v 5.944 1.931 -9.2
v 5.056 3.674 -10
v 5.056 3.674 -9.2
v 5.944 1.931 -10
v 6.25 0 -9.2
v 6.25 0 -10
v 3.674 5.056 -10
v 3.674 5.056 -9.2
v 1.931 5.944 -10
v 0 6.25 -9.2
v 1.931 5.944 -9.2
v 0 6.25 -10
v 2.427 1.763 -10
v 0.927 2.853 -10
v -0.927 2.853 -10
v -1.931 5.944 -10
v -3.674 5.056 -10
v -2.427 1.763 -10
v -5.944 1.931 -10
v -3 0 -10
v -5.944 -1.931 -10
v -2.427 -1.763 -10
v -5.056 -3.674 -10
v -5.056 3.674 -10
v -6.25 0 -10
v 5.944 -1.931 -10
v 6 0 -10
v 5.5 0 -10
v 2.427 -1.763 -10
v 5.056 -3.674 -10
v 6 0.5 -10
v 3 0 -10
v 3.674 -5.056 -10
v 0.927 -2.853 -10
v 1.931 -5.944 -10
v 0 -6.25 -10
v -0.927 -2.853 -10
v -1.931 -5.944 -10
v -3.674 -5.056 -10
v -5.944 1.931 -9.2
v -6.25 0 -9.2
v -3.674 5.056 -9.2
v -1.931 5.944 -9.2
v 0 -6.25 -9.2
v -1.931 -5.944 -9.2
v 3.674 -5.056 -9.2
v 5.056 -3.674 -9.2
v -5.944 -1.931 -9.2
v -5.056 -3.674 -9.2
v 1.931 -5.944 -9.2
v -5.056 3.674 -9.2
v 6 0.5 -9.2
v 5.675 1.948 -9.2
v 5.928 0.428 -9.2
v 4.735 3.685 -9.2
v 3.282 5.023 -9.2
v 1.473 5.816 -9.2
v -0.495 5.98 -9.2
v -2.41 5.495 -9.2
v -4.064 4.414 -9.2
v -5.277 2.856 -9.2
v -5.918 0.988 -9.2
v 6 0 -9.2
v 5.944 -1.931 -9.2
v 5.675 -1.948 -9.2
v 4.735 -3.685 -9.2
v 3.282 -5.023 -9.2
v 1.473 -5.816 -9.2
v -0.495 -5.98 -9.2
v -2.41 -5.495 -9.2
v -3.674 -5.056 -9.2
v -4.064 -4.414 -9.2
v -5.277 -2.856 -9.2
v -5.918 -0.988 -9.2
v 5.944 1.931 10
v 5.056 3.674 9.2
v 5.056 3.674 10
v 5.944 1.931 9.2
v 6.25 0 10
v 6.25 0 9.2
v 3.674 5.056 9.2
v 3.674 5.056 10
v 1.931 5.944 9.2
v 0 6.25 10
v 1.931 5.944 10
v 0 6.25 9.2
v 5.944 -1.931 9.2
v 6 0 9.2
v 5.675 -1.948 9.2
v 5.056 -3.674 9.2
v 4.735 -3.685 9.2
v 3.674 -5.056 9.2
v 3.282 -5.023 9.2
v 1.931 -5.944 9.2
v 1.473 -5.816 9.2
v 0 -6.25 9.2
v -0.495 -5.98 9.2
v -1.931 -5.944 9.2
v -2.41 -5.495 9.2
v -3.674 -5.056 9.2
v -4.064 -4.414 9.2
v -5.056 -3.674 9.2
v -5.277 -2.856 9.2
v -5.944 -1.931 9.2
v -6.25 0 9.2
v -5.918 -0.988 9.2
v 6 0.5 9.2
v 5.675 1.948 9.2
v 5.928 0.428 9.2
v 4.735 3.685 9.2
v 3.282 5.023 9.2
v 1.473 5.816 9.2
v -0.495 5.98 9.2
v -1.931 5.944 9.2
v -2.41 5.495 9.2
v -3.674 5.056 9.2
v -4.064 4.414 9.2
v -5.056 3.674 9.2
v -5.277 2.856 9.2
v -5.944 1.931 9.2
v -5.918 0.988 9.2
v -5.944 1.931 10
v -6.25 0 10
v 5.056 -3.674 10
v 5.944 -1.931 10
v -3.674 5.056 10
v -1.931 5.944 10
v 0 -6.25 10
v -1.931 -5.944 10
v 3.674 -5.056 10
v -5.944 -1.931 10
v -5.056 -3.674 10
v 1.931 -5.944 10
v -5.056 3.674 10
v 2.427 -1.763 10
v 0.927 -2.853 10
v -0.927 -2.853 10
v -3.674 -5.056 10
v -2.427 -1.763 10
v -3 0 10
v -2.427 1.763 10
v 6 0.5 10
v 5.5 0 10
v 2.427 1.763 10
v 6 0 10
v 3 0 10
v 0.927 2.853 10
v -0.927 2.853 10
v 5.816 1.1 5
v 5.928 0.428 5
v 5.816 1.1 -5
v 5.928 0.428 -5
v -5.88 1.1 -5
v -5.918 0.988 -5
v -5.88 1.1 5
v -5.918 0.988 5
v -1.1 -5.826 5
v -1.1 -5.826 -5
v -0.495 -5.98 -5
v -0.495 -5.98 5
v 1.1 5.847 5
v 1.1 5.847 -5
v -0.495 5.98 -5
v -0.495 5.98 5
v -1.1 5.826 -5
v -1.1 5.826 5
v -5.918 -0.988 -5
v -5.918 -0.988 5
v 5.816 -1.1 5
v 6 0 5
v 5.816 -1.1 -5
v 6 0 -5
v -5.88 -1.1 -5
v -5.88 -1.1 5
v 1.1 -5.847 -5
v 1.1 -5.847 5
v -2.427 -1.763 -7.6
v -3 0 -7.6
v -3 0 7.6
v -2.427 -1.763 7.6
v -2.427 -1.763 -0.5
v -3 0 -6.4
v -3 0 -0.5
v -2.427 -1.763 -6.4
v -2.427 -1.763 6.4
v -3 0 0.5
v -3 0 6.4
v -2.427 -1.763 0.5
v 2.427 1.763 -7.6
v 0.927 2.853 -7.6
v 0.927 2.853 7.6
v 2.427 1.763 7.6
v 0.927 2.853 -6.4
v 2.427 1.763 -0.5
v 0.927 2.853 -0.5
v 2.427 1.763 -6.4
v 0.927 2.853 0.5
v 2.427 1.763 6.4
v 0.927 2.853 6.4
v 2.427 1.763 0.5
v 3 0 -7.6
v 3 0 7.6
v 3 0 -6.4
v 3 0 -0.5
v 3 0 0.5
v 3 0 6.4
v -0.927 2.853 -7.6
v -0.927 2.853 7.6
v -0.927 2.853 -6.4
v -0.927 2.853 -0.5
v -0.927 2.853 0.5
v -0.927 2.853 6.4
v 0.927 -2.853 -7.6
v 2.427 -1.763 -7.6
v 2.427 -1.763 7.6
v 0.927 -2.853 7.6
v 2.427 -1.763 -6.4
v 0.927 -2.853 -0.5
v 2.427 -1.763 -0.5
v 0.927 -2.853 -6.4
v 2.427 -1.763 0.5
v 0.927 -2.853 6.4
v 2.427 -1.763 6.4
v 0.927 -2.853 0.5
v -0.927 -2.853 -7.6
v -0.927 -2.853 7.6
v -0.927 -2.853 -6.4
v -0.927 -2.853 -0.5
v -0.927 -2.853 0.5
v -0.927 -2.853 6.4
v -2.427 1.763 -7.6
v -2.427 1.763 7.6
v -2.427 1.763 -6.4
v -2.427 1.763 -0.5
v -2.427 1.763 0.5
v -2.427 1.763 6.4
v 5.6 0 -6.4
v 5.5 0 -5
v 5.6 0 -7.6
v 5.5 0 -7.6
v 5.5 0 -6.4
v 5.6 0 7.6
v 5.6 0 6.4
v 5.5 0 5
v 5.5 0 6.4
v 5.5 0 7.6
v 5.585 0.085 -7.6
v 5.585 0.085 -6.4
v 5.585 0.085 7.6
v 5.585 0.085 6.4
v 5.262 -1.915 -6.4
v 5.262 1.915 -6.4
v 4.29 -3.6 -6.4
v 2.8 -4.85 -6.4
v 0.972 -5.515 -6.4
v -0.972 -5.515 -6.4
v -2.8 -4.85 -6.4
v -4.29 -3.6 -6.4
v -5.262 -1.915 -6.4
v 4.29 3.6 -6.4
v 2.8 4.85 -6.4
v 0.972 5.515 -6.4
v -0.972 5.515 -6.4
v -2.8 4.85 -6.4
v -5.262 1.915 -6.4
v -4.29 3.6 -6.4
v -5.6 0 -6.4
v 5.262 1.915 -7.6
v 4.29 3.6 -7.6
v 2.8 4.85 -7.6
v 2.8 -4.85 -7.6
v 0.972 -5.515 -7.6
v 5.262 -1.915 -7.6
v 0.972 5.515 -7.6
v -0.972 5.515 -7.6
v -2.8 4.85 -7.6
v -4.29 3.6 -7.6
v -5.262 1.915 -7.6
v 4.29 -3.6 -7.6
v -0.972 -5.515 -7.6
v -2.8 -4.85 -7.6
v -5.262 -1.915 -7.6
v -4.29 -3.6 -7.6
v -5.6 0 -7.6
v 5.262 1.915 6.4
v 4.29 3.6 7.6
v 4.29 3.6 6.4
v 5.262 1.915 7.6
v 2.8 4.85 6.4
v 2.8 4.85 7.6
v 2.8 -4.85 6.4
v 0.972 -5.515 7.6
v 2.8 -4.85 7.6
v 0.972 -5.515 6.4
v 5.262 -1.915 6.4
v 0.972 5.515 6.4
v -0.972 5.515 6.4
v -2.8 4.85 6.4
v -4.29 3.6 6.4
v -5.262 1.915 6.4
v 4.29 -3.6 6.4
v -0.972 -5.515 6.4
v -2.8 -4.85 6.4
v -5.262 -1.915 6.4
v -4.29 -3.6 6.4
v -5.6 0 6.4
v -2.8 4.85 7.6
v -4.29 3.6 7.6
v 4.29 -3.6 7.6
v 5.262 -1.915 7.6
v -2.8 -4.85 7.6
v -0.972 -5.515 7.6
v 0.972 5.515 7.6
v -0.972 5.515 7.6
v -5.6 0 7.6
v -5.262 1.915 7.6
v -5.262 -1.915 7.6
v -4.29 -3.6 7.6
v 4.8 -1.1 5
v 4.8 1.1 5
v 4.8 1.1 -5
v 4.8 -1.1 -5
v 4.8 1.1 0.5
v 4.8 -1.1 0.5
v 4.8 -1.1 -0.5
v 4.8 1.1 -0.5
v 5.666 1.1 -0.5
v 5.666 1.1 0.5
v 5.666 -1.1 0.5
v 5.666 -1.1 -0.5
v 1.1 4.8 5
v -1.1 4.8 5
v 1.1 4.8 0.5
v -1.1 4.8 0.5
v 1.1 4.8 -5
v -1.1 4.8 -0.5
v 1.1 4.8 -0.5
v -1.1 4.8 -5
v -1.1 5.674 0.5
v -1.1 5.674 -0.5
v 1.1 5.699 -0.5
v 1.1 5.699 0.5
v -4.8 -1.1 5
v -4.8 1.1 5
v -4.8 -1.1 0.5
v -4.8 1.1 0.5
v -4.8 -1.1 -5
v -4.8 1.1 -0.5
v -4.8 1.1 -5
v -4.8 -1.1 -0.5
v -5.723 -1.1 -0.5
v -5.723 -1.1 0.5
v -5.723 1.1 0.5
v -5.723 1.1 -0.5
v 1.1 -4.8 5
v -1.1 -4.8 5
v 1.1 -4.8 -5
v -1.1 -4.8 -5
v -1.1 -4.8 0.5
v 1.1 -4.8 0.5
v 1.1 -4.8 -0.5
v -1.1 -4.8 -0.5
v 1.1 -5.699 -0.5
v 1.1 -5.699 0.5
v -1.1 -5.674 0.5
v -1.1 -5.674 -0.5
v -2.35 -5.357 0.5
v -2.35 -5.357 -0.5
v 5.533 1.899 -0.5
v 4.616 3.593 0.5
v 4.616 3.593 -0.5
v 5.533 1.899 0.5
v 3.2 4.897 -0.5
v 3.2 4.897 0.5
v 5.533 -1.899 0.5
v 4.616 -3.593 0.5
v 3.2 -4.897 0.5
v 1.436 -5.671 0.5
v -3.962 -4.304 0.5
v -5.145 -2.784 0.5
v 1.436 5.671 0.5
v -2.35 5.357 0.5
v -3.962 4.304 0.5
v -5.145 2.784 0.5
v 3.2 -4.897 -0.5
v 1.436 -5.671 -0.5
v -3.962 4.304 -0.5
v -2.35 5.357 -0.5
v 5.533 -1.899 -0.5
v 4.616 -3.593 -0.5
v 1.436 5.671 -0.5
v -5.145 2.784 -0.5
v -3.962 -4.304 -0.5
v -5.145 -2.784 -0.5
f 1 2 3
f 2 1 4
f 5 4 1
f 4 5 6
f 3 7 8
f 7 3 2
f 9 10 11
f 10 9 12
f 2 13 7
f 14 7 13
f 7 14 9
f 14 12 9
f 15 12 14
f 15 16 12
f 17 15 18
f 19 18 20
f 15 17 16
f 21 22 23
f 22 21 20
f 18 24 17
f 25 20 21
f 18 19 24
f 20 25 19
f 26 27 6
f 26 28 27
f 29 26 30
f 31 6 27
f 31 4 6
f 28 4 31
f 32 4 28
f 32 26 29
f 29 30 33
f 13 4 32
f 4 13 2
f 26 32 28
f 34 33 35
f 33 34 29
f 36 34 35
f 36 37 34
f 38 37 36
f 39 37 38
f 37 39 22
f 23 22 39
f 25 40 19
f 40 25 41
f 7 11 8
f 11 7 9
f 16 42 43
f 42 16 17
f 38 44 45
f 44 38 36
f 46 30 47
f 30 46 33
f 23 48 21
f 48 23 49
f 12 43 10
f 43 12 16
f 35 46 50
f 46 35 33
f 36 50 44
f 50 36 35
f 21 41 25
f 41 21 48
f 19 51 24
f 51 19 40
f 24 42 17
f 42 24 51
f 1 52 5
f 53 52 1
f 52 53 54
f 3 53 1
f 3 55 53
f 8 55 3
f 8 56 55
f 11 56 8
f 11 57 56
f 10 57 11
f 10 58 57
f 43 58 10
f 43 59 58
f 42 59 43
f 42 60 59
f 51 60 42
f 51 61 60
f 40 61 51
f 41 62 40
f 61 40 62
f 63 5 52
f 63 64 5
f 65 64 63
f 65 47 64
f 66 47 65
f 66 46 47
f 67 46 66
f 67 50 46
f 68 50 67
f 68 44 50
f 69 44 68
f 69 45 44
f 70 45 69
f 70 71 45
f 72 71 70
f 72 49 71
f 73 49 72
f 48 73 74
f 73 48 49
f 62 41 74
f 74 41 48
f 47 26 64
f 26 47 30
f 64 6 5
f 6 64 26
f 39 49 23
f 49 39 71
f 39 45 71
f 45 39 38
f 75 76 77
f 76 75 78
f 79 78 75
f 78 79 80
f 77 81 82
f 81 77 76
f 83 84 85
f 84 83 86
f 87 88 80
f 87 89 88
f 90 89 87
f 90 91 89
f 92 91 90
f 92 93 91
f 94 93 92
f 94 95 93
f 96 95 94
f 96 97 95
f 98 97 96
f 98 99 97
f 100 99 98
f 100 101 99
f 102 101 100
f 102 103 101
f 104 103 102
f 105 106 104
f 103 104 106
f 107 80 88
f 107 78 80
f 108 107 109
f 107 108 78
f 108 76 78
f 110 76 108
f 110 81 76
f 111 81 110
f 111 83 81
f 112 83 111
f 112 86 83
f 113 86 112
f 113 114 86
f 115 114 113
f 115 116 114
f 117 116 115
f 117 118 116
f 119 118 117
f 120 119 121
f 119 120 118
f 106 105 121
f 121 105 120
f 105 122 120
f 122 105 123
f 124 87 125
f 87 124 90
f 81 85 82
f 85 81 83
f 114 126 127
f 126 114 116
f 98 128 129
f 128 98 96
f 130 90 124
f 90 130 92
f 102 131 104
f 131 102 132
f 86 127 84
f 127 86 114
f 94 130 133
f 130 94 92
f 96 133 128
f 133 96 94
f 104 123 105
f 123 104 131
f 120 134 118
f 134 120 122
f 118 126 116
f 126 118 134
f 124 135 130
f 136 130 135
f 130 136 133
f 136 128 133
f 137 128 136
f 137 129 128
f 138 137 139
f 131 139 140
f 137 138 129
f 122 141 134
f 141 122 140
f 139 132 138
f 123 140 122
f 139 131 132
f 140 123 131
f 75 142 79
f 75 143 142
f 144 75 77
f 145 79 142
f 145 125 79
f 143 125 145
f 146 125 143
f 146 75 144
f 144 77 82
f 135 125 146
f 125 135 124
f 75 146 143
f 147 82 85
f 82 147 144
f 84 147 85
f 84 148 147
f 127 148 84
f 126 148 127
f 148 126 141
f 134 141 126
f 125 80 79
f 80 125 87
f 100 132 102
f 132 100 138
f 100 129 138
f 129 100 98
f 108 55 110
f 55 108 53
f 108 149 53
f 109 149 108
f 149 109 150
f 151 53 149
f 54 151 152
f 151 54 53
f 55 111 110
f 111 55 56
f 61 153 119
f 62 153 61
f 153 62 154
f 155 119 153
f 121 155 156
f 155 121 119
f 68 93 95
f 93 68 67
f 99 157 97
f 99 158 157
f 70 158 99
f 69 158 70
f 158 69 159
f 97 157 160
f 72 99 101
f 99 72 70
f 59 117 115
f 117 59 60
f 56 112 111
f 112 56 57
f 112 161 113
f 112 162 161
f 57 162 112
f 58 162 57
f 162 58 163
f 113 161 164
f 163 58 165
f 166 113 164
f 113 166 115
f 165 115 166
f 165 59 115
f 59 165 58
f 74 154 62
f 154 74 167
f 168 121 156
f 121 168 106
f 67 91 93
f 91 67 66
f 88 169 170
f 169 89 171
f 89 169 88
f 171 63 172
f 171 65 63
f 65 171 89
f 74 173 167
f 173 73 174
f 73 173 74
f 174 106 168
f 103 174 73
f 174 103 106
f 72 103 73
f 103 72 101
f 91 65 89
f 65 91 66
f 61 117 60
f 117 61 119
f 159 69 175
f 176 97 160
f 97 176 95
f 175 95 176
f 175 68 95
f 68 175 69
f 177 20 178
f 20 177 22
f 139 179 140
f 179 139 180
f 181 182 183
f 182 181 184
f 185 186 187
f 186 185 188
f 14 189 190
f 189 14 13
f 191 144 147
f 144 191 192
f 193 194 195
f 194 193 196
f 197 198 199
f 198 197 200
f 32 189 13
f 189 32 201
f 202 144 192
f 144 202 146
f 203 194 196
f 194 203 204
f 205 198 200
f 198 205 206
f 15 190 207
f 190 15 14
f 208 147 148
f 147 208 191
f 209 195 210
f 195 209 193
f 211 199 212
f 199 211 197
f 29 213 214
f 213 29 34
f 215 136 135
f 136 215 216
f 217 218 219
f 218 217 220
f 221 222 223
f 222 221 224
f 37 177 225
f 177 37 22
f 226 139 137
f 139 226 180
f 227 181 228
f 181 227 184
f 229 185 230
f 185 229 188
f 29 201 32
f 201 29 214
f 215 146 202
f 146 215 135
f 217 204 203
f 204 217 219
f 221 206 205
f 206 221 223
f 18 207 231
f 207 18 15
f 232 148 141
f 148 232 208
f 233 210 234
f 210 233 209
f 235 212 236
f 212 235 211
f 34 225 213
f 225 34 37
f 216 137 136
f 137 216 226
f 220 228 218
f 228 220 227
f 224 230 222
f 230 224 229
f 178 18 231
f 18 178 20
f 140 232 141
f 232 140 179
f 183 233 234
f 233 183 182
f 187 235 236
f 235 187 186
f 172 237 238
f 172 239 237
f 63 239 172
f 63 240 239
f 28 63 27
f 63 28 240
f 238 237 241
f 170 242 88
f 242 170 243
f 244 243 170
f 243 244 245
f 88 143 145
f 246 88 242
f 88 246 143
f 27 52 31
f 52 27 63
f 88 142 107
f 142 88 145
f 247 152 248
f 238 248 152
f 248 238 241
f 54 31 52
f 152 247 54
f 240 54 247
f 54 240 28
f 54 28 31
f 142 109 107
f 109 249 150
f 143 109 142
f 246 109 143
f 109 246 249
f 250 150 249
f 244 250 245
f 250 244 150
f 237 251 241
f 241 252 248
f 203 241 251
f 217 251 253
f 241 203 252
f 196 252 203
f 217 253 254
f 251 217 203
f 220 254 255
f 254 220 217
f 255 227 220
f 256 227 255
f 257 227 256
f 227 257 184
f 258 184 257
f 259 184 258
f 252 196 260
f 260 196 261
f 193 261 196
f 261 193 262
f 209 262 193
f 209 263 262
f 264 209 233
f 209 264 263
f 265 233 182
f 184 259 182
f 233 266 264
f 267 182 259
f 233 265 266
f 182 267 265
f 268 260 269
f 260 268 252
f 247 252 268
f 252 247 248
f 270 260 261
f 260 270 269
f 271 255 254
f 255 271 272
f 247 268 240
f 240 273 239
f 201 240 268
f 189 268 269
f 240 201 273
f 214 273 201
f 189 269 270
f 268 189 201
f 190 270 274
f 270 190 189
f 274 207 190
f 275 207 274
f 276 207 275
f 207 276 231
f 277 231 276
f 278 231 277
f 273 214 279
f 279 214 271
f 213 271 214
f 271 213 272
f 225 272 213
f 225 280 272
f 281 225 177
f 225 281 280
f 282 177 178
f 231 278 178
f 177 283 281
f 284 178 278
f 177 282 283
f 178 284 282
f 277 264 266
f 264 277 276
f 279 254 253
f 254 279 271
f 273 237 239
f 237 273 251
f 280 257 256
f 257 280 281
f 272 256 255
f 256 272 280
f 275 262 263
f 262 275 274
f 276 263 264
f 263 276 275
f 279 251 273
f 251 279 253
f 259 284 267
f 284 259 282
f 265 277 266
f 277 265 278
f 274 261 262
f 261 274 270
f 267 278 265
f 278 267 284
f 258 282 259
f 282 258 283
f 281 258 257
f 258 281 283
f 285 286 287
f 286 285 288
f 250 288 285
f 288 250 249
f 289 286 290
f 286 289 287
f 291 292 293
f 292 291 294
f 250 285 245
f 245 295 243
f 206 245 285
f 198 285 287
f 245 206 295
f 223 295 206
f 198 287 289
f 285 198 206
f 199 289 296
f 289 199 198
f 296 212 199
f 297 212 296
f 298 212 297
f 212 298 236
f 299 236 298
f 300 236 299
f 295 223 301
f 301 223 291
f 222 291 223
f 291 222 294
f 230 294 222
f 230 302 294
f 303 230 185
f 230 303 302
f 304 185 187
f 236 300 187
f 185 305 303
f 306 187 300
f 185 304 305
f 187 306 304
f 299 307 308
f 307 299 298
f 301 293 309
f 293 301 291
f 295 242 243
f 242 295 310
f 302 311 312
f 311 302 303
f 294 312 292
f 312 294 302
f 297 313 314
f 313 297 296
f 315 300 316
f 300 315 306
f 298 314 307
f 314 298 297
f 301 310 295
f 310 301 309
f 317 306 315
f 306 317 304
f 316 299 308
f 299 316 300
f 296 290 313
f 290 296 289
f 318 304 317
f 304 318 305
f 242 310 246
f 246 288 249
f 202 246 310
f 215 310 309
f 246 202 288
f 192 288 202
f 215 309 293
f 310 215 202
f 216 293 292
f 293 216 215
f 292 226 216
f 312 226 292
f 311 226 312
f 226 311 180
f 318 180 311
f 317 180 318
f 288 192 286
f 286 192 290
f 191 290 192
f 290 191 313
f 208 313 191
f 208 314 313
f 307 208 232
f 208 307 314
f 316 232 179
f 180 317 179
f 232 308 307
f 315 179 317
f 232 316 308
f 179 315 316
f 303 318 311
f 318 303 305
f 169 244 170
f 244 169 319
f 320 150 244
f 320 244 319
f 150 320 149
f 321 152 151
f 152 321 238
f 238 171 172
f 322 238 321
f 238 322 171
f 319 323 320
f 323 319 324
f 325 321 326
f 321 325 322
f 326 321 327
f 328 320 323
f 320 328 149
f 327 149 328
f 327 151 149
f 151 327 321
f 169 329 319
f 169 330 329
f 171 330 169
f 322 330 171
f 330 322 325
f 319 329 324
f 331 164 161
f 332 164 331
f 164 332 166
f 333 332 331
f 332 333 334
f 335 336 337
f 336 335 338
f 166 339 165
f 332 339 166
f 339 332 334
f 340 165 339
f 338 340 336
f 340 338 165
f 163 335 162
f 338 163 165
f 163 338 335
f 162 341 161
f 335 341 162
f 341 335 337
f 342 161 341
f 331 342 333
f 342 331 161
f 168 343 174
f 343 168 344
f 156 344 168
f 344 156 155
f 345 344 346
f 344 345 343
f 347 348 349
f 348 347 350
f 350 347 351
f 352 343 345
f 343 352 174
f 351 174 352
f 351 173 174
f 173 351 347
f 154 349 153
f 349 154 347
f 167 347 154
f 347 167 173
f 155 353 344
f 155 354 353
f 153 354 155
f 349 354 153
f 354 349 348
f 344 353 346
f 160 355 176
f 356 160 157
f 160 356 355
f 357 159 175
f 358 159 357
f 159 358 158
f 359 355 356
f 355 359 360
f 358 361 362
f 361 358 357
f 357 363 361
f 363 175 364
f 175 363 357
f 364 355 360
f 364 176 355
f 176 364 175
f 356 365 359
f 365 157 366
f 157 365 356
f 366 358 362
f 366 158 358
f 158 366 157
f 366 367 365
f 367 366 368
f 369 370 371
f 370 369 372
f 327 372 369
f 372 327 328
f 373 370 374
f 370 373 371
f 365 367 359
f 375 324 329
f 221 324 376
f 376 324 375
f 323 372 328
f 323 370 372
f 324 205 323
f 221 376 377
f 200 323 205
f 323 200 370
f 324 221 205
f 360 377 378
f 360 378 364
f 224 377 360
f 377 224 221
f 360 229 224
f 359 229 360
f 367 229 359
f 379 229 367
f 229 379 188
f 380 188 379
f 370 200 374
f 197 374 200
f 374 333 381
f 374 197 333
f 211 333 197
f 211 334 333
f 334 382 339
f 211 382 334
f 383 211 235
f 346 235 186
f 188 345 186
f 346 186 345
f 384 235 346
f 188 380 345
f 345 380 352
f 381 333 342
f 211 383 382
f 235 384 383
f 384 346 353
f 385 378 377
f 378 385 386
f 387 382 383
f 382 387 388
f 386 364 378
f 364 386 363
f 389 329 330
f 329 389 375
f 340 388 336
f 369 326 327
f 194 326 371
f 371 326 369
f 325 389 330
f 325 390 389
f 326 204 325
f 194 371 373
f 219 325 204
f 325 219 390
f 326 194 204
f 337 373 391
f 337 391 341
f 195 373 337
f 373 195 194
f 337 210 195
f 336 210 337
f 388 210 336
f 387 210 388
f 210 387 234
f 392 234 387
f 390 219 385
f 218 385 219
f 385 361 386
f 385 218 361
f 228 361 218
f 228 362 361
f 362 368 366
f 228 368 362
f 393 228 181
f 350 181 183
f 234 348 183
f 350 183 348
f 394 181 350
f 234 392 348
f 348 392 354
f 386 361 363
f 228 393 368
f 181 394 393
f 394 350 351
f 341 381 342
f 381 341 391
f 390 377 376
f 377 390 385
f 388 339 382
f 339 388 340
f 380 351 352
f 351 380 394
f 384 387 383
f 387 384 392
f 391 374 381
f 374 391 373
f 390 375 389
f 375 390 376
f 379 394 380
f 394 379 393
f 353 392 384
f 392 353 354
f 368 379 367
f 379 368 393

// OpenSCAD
// Parameters
bore_d = 6; //[3:12:0.1]
od_d = 12; //[6:24:0.1]
L = 19; //[10:38:0.1]
chamfer = 0.5; //[0.2:2:0.1]
overlap = 1; //[0.5:2:0.1]
groove_w = 1.2; //[0.6:2.4:0.1]
groove_depth = 0.4; //[0.2:1:0.05]
groove_offset = 2.5; //[1.5:5:0.1]
lip_w = 0.8; //[0.4:2:0.1]
lip_radial = 0.25; //[0.1:0.8:0.05]
window_w = 2.2; //[1.2:4:0.1]
window_h = 10; //[6:16:0.1]
window_depth = 2.2; //[1:4:0.1]
window_count = 4; //[2:8:1]
marking_depth = 0.15; //[0.05:0.4:0.05]
marking_w = 1; //[0.5:3:0.1]

// Base Shapes
module outer_cylinder_body() {
  cylinder(h=L, r=od_d/2, center=true);
}

module through_bore() {
  cylinder(h=L + 2*overlap, r=bore_d/2, center=true);
}

module end_chamfer_profile() {
  linear_extrude(height=L + 2*overlap, center=true)
    polygon(points=[
      [bore_d/2, 0],
      [od_d/2, 0],
      [od_d/2, chamfer],
      [od_d/2 - chamfer, 0]
    ]);
}

module outer_groove_left() {
  translate([0, 0, -L/2 + groove_offset])
    cylinder(h=groove_w, r=od_d/2 - groove_depth, center=true);
}

module outer_groove_right() {
  translate([0, 0, L/2 - groove_offset])
    cylinder(h=groove_w, r=od_d/2 - groove_depth, center=true);
}

module seal_lip_left() {
  translate([0, 0, -L/2 + lip_w/2 - overlap/2])
    cylinder(h=lip_w, r=od_d/2 + lip_radial, center=true);
}

module seal_lip_right() {
  translate([0, 0, L/2 - lip_w/2 + overlap/2])
    cylinder(h=lip_w, r=od_d/2 + lip_radial, center=true);
}

module ball_window_base() {
  translate([od_d/2 - window_depth/2 + overlap, 0, 0])
    cube([window_depth, window_w, window_h], center=true);
}

module ball_window_rot90() {
  rotate([0, 0, 90])
    ball_window_base();
}

module ball_window_rot180() {
  rotate([0, 0, 180])
    ball_window_base();
}

module ball_window_rot270() {
  rotate([0, 0, 270])
    ball_window_base();
}

module engraved_markings_band() {
  cylinder(h=marking_w, r=od_d/2 - marking_depth, center=true);
}

// Operations
module ball_circuit_windows() {
  union() {
    ball_window_base();
    ball_window_rot90();
    ball_window_rot180();
    ball_window_rot270();
  }
}

module outer_grooves() {
  union() {
    outer_groove_left();
    outer_groove_right();
  }
}

module seal_lips() {
  union() {
    seal_lip_left();
    seal_lip_right();
  }
}

module bearing_with_lips() {
  union() {
    outer_cylinder_body();
    seal_lips();
  }
}

module bearing_minus_bore() {
  difference() {
    bearing_with_lips();
    through_bore();
  }
}

module bearing_minus_chamfers() {
  difference() {
    bearing_minus_bore();
    end_chamfer_profile();
  }
}

module bearing_minus_outer_grooves() {
  difference() {
    bearing_minus_chamfers();
    outer_grooves();
  }
}

module bearing_minus_windows() {
  difference() {
    bearing_minus_outer_grooves();
    ball_circuit_windows();
  }
}

module bearing_minus_markings() {
  difference() {
    bearing_minus_windows();
    engraved_markings_band();
  }
}

// Final Output
bearing_minus_markings();
